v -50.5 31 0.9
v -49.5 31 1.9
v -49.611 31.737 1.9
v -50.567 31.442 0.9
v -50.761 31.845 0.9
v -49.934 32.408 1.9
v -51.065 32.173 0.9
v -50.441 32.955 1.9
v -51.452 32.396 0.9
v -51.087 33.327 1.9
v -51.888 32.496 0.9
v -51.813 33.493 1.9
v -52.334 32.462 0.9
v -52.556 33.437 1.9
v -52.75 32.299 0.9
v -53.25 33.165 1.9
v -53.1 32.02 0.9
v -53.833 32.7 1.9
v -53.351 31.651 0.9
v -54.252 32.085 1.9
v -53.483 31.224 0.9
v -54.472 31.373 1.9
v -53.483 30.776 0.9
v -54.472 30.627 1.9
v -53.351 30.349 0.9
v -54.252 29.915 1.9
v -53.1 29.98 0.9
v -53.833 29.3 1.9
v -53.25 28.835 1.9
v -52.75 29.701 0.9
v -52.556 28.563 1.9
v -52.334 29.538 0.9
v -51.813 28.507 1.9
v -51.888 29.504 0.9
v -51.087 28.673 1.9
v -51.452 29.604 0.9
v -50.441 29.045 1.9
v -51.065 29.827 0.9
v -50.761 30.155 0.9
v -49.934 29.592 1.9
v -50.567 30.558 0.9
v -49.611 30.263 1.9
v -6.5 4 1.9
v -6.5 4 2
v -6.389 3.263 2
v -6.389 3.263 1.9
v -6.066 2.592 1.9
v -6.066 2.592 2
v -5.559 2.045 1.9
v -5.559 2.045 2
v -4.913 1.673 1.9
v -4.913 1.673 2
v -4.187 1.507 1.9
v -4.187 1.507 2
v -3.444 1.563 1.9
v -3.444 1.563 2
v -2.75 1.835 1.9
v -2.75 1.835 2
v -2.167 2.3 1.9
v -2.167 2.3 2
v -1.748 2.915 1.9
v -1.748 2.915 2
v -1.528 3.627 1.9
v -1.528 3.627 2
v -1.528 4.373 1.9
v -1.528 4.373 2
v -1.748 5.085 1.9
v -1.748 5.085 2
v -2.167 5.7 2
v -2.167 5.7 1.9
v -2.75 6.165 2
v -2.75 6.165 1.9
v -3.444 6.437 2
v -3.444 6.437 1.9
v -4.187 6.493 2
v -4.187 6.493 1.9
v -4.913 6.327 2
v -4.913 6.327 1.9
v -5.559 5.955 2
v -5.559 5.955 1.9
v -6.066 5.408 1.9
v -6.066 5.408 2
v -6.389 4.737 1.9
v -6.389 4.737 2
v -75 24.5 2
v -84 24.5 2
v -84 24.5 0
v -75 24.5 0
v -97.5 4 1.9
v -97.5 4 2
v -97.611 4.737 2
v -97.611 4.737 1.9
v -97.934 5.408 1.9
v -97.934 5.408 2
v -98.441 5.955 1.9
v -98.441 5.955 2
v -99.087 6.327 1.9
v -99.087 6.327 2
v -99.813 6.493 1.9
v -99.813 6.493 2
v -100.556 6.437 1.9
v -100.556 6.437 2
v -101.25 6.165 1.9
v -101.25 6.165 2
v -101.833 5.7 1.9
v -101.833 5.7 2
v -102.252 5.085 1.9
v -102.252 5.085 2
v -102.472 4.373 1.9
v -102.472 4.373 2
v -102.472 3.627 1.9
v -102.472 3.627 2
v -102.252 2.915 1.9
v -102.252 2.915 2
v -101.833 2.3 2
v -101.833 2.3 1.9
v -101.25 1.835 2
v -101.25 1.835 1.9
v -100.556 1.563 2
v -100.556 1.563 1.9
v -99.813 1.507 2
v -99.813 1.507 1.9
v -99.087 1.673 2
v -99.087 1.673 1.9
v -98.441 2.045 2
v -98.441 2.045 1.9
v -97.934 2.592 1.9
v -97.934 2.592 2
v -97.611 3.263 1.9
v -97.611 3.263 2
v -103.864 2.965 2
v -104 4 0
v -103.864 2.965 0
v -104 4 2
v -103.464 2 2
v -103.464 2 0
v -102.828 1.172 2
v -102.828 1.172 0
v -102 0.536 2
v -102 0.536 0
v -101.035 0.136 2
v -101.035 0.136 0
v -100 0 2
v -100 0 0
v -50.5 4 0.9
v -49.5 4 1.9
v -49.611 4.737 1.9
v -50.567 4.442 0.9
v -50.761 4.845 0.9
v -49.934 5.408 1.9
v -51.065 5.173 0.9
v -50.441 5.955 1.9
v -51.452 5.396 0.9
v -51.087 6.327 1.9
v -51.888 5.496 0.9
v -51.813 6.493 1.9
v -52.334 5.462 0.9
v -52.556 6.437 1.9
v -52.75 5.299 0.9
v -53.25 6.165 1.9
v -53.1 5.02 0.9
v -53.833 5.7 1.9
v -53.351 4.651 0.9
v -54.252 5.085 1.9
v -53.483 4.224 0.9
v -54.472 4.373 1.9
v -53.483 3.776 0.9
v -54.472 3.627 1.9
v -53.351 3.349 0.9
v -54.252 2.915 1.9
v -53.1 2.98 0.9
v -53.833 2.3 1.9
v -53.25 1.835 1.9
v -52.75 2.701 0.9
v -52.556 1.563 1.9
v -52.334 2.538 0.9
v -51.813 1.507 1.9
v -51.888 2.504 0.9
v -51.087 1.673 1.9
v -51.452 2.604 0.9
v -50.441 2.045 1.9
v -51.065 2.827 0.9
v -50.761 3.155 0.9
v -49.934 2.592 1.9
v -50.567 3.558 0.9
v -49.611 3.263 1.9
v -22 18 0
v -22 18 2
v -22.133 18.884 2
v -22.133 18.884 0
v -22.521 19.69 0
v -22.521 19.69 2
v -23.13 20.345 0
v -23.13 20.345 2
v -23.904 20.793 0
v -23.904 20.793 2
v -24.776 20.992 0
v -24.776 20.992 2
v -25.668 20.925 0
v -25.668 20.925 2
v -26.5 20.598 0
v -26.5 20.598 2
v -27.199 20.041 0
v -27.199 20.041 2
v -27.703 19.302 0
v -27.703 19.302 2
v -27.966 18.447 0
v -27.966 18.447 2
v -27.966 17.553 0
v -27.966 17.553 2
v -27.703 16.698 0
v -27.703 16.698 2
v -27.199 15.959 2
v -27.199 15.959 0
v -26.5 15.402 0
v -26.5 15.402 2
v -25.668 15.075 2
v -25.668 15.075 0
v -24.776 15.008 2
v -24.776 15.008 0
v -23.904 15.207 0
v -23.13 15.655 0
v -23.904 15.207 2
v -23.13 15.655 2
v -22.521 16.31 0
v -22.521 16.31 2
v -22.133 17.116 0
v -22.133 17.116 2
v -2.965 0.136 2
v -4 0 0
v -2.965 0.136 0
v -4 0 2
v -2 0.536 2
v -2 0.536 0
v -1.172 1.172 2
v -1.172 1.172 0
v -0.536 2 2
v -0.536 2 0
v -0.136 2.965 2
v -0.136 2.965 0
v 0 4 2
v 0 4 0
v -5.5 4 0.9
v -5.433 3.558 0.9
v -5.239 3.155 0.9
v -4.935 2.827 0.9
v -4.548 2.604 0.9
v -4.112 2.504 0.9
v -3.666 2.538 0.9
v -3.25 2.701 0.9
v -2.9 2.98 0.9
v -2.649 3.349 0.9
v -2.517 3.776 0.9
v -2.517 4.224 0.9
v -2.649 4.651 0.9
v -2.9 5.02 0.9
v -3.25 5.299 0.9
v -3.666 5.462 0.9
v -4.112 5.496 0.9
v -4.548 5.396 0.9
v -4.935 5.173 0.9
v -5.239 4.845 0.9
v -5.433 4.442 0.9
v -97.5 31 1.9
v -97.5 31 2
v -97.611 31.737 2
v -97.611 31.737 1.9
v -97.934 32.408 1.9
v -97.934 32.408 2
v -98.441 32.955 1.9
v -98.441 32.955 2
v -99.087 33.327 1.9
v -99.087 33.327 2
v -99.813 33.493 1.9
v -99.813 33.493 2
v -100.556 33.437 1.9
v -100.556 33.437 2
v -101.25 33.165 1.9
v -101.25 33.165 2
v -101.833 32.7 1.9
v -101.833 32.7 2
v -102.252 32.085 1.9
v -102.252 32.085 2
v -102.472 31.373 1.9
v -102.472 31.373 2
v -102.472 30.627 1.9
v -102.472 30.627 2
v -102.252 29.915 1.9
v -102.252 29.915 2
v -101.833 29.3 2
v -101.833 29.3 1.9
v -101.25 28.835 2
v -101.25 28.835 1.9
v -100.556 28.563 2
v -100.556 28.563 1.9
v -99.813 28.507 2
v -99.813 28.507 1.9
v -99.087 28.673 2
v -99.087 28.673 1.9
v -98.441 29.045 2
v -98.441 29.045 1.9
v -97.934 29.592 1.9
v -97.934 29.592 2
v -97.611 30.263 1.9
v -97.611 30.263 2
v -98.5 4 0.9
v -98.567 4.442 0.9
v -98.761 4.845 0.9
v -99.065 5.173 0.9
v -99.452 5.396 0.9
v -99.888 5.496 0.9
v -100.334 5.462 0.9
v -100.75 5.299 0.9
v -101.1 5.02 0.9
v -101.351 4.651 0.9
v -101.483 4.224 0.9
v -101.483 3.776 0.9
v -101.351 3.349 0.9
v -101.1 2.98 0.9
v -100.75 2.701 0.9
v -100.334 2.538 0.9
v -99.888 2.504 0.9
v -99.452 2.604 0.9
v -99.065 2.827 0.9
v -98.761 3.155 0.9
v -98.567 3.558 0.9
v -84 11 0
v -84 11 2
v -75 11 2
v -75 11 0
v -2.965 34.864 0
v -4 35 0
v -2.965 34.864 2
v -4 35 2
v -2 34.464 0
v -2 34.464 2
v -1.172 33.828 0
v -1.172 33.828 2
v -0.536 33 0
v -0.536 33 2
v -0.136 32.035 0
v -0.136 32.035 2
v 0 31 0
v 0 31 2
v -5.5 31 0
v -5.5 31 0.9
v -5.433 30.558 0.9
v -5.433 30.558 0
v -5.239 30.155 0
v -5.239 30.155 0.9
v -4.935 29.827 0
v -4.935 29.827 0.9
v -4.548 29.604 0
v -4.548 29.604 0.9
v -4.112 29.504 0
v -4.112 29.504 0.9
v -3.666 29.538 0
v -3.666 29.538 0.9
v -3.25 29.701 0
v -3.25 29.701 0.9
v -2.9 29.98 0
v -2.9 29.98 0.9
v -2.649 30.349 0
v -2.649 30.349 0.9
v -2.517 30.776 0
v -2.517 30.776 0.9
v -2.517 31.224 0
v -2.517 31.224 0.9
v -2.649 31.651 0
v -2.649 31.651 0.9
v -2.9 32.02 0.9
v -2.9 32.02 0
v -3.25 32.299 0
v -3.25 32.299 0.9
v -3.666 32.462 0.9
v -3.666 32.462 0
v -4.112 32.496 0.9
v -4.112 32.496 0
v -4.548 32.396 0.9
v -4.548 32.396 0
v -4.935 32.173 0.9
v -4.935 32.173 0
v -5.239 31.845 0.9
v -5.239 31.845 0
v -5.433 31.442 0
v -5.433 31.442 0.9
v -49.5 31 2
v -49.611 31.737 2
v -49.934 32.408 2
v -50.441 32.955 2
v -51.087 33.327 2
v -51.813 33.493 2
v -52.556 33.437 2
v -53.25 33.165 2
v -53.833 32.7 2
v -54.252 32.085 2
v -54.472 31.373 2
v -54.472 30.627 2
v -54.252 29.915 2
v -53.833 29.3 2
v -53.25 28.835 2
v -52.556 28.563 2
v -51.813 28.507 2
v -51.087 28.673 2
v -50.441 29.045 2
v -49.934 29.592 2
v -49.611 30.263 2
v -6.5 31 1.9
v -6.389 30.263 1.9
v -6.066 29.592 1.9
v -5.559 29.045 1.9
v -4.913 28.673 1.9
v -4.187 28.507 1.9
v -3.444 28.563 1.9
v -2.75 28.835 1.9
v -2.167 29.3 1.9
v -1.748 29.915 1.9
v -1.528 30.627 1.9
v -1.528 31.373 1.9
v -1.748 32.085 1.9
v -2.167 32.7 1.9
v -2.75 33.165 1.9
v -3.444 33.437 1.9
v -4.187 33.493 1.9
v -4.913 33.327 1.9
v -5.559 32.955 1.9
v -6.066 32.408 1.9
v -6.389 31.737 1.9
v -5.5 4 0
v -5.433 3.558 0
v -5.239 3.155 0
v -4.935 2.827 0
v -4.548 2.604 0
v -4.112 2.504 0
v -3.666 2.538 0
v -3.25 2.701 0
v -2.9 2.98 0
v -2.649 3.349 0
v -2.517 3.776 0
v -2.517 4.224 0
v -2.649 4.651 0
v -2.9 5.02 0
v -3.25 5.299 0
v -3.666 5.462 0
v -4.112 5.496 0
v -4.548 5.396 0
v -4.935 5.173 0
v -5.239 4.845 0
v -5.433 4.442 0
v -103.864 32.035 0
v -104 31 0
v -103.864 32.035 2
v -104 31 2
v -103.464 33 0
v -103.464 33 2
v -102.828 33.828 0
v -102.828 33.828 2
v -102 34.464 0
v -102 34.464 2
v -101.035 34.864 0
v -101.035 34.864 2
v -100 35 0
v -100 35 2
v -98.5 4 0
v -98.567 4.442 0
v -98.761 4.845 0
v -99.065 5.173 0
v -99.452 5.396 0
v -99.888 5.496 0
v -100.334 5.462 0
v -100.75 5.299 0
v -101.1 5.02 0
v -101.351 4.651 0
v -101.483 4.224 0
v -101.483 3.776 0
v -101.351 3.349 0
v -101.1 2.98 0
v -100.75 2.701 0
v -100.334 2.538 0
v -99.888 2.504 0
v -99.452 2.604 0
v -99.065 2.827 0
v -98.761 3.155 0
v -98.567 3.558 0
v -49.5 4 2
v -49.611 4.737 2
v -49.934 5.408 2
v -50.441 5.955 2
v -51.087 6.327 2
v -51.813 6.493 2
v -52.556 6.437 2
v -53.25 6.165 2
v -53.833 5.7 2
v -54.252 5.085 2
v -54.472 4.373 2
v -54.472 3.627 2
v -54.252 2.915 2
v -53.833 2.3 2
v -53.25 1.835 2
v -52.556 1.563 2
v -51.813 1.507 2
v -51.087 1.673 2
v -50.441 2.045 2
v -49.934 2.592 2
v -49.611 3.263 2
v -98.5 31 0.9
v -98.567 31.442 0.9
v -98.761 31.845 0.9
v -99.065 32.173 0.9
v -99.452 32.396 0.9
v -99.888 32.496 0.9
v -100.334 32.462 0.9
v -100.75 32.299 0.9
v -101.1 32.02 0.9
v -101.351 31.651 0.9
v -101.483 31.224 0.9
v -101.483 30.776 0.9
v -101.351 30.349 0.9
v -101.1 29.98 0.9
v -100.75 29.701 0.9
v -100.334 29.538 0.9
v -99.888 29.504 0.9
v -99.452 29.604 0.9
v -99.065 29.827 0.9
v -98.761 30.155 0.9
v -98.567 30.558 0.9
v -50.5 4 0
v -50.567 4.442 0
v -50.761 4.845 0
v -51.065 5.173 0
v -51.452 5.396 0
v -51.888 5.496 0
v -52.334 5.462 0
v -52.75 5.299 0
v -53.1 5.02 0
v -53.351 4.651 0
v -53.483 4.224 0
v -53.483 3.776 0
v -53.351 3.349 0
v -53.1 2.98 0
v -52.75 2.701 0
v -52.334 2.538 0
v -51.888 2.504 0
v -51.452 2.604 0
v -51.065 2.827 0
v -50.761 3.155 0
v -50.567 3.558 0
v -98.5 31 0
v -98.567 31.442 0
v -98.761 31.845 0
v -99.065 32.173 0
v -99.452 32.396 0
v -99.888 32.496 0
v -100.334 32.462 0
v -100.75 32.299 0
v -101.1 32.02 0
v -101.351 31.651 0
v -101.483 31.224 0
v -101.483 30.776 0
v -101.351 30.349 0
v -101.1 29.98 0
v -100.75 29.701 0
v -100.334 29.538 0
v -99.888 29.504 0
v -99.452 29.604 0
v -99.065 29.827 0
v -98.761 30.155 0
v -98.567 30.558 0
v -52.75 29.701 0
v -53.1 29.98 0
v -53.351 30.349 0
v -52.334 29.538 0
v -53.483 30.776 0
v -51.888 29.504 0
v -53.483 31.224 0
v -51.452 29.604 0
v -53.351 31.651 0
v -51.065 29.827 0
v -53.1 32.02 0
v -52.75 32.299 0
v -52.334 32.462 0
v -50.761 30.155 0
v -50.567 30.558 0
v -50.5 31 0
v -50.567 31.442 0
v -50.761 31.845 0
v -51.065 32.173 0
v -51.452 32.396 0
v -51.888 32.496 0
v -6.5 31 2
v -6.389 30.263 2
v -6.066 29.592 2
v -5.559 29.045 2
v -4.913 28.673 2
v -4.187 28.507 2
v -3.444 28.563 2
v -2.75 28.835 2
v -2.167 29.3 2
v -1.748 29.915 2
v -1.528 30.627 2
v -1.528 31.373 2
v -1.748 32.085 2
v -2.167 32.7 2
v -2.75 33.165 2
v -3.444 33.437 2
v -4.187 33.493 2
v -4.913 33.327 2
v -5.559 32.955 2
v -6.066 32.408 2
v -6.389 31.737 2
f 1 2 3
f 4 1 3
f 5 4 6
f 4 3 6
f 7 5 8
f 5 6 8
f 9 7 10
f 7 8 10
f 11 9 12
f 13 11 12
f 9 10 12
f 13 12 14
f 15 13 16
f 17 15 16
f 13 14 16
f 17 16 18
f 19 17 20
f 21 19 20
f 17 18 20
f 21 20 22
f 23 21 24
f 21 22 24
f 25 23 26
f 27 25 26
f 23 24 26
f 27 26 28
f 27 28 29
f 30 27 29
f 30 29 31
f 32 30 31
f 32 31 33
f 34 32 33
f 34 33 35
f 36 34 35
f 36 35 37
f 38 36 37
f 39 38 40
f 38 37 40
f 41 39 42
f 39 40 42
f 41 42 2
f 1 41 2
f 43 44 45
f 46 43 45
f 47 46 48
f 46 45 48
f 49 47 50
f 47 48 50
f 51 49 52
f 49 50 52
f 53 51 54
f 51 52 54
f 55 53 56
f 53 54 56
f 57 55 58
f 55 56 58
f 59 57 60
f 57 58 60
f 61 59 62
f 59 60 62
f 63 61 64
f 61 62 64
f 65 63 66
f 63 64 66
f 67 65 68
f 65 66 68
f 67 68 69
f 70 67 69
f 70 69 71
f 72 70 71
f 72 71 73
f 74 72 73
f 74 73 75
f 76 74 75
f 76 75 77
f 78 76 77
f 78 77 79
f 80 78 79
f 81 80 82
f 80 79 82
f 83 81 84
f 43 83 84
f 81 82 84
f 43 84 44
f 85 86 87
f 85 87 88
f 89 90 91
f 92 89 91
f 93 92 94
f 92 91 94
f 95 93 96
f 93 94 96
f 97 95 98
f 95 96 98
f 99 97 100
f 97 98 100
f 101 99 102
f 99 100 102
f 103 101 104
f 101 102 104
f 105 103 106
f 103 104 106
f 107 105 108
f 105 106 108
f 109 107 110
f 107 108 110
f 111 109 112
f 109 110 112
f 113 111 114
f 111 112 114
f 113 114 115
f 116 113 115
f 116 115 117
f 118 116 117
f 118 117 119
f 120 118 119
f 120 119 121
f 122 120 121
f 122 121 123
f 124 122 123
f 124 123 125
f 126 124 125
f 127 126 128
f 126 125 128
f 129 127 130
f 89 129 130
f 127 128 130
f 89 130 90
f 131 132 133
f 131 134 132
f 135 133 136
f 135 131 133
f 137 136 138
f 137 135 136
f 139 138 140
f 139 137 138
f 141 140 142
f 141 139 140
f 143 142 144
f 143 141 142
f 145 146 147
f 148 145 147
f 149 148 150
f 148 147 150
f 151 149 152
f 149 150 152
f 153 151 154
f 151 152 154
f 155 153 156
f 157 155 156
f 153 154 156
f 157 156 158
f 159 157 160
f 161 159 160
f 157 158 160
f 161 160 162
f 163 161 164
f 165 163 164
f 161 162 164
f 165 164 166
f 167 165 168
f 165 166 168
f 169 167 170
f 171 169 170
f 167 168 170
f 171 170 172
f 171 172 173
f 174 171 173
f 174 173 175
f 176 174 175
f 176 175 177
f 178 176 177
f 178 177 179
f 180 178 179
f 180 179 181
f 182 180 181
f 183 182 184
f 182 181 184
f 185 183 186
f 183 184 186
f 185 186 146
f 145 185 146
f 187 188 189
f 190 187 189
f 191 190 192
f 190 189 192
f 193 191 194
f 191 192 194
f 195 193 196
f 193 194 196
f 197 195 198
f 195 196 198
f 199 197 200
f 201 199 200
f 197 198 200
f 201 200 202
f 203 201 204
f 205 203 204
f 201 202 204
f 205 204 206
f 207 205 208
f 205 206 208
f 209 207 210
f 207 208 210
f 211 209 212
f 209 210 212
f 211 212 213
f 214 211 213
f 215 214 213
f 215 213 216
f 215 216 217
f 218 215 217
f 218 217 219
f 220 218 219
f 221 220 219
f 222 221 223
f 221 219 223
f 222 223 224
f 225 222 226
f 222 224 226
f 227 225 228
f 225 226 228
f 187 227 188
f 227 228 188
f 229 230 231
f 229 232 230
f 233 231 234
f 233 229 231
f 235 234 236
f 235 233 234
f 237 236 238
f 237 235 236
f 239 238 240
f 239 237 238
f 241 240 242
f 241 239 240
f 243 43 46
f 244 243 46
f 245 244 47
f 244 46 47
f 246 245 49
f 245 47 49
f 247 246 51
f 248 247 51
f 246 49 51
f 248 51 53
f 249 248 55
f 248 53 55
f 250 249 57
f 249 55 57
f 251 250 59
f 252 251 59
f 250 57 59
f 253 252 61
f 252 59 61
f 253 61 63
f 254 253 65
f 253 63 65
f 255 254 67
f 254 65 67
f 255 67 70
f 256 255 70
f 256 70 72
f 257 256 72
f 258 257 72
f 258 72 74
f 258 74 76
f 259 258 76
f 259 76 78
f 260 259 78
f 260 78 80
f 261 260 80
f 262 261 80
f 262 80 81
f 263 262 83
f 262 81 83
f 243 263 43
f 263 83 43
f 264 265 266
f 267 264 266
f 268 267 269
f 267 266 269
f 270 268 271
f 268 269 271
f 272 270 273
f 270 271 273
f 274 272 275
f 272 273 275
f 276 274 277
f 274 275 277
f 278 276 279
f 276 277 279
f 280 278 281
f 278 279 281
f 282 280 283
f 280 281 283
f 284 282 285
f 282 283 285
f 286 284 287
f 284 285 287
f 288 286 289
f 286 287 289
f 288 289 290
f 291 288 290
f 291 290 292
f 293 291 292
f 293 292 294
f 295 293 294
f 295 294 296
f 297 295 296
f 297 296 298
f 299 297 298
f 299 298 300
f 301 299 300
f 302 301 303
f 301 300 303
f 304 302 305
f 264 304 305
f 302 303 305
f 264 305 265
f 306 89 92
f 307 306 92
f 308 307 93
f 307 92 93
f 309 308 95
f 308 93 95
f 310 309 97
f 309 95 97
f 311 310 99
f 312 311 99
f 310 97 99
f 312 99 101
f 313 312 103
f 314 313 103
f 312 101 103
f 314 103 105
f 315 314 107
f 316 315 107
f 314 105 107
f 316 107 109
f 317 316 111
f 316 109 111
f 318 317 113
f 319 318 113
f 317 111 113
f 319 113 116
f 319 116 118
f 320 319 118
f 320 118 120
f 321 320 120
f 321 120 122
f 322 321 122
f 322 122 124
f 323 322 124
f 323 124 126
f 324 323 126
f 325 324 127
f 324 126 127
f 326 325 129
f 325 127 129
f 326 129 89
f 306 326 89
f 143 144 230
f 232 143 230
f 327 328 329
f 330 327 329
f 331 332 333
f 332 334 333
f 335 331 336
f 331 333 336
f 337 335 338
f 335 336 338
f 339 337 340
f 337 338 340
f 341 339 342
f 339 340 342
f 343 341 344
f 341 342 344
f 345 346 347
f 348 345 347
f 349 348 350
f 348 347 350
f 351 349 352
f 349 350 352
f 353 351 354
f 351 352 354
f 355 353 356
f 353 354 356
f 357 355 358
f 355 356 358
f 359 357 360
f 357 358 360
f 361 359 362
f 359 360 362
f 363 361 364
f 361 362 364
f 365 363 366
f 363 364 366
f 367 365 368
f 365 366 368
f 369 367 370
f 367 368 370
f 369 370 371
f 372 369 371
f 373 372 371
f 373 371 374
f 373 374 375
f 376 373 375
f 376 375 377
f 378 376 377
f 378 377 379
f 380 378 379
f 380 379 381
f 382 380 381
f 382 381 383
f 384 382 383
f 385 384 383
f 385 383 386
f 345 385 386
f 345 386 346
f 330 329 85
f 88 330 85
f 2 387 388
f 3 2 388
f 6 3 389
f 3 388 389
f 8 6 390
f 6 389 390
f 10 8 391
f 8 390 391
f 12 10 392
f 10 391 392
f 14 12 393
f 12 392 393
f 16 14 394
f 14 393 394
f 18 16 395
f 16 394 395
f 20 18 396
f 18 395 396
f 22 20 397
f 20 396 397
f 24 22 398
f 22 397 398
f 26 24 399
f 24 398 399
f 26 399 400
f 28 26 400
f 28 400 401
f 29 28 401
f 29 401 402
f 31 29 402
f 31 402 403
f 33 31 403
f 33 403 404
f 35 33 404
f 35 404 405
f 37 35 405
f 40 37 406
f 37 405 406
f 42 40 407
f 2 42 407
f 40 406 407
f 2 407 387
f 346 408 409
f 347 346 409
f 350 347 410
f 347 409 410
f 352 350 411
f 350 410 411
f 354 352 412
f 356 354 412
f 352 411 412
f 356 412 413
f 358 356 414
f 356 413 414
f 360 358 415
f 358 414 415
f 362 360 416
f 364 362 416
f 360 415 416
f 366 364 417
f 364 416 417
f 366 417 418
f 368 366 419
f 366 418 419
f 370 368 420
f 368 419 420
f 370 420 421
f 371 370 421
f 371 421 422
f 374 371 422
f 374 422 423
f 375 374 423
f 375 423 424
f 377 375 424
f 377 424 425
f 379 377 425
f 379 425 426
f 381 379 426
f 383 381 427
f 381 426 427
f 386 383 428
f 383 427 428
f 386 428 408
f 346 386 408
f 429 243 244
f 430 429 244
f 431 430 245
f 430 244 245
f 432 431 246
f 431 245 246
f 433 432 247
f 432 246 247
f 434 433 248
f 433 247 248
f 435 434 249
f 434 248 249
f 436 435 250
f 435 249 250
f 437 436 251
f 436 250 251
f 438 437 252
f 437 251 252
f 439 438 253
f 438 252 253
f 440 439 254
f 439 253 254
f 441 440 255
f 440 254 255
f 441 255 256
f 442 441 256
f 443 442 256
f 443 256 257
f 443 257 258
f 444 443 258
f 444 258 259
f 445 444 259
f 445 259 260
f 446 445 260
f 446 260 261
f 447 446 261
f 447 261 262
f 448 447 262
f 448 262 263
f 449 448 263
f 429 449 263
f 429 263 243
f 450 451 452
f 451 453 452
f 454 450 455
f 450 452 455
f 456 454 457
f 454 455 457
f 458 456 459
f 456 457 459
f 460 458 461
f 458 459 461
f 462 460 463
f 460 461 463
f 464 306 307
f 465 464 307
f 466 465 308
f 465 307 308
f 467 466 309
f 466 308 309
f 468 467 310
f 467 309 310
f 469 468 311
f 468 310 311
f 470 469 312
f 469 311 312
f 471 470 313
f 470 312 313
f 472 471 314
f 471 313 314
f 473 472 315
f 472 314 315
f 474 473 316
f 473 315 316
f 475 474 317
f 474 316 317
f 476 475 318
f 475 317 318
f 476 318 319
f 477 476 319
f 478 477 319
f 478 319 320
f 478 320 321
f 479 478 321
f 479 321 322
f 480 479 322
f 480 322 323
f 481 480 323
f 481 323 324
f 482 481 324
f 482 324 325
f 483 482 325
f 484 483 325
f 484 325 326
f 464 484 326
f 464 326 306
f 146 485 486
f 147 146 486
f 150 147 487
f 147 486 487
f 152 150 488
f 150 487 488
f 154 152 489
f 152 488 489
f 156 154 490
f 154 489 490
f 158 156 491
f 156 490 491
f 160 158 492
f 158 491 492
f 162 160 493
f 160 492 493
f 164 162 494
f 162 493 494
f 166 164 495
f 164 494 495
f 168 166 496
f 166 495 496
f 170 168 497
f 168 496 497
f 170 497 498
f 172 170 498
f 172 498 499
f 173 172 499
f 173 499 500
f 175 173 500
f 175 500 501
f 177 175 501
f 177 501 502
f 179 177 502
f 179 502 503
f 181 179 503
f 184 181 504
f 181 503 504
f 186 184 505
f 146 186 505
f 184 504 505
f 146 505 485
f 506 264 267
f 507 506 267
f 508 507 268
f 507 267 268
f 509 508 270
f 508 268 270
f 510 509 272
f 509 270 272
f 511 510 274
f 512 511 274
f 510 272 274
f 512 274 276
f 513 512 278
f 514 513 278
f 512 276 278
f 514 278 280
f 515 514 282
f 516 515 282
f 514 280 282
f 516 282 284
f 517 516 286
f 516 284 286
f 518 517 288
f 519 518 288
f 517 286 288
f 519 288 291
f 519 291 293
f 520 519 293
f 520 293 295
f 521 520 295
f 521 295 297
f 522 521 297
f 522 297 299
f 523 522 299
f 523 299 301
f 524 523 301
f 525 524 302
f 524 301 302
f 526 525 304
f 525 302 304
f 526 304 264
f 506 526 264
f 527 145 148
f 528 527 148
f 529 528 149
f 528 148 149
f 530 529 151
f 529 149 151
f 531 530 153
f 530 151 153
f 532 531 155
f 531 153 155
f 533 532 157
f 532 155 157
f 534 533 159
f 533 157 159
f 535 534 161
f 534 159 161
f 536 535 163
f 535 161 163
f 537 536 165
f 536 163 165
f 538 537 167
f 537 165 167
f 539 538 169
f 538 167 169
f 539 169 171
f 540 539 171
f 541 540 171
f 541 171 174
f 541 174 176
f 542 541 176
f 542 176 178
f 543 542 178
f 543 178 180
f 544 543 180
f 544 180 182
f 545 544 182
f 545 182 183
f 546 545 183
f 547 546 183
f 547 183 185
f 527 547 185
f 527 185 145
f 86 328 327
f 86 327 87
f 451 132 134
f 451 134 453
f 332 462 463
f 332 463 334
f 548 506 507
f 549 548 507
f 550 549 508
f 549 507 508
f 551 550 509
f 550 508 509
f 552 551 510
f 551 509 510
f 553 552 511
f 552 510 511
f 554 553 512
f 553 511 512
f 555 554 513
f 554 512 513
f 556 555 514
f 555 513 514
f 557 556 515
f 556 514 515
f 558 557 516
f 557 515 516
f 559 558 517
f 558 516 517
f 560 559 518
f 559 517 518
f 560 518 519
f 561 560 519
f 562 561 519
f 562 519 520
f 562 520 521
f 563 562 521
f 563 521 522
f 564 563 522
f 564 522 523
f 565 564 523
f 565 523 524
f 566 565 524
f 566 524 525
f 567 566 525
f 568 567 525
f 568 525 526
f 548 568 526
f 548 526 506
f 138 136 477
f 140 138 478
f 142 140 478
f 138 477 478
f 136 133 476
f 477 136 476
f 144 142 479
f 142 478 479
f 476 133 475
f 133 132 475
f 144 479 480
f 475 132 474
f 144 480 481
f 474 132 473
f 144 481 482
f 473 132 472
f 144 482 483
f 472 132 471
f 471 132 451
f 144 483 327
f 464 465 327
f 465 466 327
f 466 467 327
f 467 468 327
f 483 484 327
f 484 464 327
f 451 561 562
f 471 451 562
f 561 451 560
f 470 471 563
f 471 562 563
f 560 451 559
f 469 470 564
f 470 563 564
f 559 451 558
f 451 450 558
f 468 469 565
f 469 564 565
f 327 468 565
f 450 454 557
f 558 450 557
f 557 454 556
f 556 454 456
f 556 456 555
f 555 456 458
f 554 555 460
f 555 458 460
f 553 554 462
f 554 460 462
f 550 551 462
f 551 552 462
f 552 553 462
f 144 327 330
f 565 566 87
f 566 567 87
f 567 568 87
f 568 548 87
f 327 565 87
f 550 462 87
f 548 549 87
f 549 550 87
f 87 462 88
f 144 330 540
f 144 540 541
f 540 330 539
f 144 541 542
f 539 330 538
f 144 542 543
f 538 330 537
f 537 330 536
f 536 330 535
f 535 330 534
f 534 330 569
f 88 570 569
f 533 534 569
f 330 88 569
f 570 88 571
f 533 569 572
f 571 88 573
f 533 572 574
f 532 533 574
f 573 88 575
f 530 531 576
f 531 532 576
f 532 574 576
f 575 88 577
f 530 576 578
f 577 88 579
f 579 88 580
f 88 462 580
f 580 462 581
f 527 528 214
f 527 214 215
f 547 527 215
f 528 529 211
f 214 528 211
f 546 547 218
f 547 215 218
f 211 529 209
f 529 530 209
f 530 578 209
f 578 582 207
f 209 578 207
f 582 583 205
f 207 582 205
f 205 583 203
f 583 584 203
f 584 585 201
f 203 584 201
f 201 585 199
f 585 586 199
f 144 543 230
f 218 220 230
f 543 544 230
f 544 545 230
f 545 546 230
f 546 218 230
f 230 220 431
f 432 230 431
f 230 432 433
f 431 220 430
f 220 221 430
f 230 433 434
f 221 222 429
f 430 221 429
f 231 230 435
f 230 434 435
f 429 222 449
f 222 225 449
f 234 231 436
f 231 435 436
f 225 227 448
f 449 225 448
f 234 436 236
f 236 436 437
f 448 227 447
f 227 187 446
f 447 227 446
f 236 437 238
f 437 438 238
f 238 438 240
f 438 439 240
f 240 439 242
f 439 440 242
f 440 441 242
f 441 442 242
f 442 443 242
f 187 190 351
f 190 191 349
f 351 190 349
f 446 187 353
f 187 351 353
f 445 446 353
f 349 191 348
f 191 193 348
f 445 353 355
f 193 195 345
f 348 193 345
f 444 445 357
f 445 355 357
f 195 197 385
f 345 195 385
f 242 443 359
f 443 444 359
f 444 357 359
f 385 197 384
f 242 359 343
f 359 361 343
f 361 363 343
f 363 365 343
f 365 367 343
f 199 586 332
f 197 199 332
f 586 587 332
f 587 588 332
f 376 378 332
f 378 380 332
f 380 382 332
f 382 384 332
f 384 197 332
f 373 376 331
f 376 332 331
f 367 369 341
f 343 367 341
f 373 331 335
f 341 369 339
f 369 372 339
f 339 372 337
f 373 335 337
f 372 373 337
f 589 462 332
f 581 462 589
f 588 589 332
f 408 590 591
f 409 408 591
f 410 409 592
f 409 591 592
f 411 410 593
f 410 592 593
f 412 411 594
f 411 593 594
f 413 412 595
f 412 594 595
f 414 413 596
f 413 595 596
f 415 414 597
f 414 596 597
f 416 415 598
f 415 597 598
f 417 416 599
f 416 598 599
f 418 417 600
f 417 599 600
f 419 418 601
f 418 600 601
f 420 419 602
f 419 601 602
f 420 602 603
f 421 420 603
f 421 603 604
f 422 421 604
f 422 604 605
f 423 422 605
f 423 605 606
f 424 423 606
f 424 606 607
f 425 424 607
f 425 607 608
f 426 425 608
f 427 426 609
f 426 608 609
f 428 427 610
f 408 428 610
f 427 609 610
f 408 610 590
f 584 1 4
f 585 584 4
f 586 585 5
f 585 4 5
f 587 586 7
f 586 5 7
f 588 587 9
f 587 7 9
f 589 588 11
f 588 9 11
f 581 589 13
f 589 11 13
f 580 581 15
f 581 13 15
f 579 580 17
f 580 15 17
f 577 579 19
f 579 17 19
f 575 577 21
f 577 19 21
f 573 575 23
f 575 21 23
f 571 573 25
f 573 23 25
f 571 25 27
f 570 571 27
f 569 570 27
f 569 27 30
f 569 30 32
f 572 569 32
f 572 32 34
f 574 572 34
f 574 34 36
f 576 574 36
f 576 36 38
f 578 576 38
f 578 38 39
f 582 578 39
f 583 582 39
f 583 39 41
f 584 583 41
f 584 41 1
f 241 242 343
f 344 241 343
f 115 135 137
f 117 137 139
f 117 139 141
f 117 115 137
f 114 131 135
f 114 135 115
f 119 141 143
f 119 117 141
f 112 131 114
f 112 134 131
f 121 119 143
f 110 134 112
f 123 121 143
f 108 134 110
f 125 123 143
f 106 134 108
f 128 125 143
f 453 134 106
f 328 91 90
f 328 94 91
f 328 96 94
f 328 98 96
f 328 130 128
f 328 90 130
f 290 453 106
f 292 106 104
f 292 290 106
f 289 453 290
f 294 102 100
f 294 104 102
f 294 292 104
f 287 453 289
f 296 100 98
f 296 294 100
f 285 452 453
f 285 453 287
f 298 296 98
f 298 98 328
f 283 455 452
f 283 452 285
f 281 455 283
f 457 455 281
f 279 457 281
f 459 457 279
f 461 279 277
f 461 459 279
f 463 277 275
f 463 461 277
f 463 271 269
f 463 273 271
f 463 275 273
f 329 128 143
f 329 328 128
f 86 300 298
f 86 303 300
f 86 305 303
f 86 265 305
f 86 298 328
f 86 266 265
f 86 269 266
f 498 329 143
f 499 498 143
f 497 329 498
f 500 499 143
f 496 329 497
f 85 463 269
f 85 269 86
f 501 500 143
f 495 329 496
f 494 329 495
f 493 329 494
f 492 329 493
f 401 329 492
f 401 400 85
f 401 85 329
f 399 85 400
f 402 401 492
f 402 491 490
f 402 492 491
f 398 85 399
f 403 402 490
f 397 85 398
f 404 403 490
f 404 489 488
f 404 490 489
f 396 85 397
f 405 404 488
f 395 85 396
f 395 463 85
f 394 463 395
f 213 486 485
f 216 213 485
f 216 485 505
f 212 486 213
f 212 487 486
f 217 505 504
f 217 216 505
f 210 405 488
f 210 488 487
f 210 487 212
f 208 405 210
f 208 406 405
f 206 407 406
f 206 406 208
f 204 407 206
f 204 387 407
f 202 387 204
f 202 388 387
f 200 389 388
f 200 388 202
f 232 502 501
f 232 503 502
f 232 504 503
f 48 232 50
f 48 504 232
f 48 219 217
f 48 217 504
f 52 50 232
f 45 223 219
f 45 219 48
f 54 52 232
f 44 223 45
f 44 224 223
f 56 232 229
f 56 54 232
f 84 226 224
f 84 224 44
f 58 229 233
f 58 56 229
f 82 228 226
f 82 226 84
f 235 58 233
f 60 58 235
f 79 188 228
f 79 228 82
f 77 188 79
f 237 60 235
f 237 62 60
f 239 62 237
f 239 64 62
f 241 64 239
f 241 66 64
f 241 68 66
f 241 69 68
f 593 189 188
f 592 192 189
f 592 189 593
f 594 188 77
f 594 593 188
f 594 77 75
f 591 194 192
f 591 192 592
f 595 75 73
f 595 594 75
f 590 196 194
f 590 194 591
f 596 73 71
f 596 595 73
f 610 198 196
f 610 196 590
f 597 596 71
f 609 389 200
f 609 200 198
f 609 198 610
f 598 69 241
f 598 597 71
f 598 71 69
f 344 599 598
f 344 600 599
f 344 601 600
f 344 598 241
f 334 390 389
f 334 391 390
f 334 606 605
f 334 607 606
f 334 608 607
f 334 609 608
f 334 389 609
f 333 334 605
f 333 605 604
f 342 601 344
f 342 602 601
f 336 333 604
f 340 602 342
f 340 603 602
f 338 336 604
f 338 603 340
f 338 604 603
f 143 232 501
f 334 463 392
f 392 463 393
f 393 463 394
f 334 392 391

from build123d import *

# Parameters (mm, degrees)
IZIM1_W                     = 104
IZIM1_H                     = 35
Y_KSEKLIK_EKSTR_ZYON1_DEPTH = 2
IZIM2_R                     = 1.5
KES_EKSTR_ZYON1_DEPTH       = 2
IZIM3_R                     = 2.5
KES_EKSTR_ZYON2_DEPTH       = 0.1
PAH2_SIZE                   = 1
IZIM4_R                     = 1.5
KES_EKSTR_ZYON3_DEPTH       = 2
IZIM5_R                     = 2.5
KES_EKSTR_ZYON4_DEPTH       = 0.1
PAH3_SIZE                   = 1
RADYUS1_R                   = 4
IZIM7_R                     = 3
IZIM7_W                     = 9
IZIM7_H                     = 13.5
KES_EKSTR_ZYON6_DEPTH       = 2


with BuildPart() as part:
    # Çizim1 → Yükseklik-Ekstrüzyon1 (new body)
    with BuildSketch(Plane.XY):
        with Locations((-52, 17.5)):
            Rectangle(IZIM1_W, IZIM1_H)
    extrude(amount=Y_KSEKLIK_EKSTR_ZYON1_DEPTH)

    # Çizim2 → Kes-Ekstrüzyon1 (cut)
    with BuildSketch(Plane.XY.offset(2)):
        with Locations((-100, 31)):
            Circle(IZIM2_R)
        with Locations((-100, 4)):
            Circle(IZIM2_R)
        with Locations(Location((-4, 4, 0), (0, 0, 180))):
            Circle(IZIM2_R)
        with Locations(Location((-4, 31, 0), (0, 0, 180))):
            Circle(IZIM2_R)
    extrude(amount=-KES_EKSTR_ZYON1_DEPTH, mode=Mode.SUBTRACT)

    # Çizim3 → Kes-Ekstrüzyon2 (cut)
    with BuildSketch(Plane.XY.offset(2)):
        with Locations((-100, 31)):
            Circle(IZIM3_R)
        with Locations((-100, 4)):
            Circle(IZIM3_R)
        with Locations(Location((-4, 4, 0), (0, 0, 180))):
            Circle(IZIM3_R)
        with Locations(Location((-4, 31, 0), (0, 0, 180))):
            Circle(IZIM3_R)
    extrude(amount=-KES_EKSTR_ZYON2_DEPTH, mode=Mode.SUBTRACT)

    # Pah2
    pah2_edges = [part.edges().sort_by_distance(p)[0] for p in [
        (-2.5, 31, 1.9),
        (-2.5, 4, 1.9),
        (-101.5, 4, 1.9),
        (-101.5, 31, 1.9),
    ]]
    chamfer(pah2_edges, length=PAH2_SIZE - 0.0001)  # a hair under: the kernel refuses the full size

    # Çizim4 → Kes-Ekstrüzyon3 (cut)
    with BuildSketch(Plane.XY.offset(2)):
        with Locations((-52, 31)):
            Circle(IZIM4_R)
        with Locations((-52, 4)):
            Circle(IZIM4_R)
    extrude(amount=-KES_EKSTR_ZYON3_DEPTH, mode=Mode.SUBTRACT)

    # Çizim5 → Kes-Ekstrüzyon4 (cut)
    with BuildSketch(Plane.XY.offset(2)):
        with Locations((-52, 31)):
            Circle(IZIM5_R)
        with Locations((-52, 4)):
            Circle(IZIM5_R)
    extrude(amount=-KES_EKSTR_ZYON4_DEPTH, mode=Mode.SUBTRACT)

    # Pah3
    pah3_edges = [part.edges().sort_by_distance(p)[0] for p in [
        (-53.5, 31, 1.9),
        (-53.5, 4, 1.9),
    ]]
    chamfer(pah3_edges, length=PAH3_SIZE - 0.0001)  # a hair under: the kernel refuses the full size

    # Radyus1
    radyus1_edges = [part.edges().sort_by_distance(p)[0] for p in [
        (0, 0, 1),
        (-104, 0, 1),
        (-104, 35, 1),
        (0, 35, 1),
    ]]
    fillet(radyus1_edges, radius=RADYUS1_R)

    # Çizim7 → Kes-Ekstrüzyon6 (cut)
    with BuildSketch(Plane.XY.offset(2)):
        with Locations((-25, 18)):
            Circle(IZIM7_R)
        with Locations((-79.5, 17.75)):
            Rectangle(IZIM7_W, IZIM7_H)
    extrude(amount=-KES_EKSTR_ZYON6_DEPTH, mode=Mode.SUBTRACT)


solid = part.part
